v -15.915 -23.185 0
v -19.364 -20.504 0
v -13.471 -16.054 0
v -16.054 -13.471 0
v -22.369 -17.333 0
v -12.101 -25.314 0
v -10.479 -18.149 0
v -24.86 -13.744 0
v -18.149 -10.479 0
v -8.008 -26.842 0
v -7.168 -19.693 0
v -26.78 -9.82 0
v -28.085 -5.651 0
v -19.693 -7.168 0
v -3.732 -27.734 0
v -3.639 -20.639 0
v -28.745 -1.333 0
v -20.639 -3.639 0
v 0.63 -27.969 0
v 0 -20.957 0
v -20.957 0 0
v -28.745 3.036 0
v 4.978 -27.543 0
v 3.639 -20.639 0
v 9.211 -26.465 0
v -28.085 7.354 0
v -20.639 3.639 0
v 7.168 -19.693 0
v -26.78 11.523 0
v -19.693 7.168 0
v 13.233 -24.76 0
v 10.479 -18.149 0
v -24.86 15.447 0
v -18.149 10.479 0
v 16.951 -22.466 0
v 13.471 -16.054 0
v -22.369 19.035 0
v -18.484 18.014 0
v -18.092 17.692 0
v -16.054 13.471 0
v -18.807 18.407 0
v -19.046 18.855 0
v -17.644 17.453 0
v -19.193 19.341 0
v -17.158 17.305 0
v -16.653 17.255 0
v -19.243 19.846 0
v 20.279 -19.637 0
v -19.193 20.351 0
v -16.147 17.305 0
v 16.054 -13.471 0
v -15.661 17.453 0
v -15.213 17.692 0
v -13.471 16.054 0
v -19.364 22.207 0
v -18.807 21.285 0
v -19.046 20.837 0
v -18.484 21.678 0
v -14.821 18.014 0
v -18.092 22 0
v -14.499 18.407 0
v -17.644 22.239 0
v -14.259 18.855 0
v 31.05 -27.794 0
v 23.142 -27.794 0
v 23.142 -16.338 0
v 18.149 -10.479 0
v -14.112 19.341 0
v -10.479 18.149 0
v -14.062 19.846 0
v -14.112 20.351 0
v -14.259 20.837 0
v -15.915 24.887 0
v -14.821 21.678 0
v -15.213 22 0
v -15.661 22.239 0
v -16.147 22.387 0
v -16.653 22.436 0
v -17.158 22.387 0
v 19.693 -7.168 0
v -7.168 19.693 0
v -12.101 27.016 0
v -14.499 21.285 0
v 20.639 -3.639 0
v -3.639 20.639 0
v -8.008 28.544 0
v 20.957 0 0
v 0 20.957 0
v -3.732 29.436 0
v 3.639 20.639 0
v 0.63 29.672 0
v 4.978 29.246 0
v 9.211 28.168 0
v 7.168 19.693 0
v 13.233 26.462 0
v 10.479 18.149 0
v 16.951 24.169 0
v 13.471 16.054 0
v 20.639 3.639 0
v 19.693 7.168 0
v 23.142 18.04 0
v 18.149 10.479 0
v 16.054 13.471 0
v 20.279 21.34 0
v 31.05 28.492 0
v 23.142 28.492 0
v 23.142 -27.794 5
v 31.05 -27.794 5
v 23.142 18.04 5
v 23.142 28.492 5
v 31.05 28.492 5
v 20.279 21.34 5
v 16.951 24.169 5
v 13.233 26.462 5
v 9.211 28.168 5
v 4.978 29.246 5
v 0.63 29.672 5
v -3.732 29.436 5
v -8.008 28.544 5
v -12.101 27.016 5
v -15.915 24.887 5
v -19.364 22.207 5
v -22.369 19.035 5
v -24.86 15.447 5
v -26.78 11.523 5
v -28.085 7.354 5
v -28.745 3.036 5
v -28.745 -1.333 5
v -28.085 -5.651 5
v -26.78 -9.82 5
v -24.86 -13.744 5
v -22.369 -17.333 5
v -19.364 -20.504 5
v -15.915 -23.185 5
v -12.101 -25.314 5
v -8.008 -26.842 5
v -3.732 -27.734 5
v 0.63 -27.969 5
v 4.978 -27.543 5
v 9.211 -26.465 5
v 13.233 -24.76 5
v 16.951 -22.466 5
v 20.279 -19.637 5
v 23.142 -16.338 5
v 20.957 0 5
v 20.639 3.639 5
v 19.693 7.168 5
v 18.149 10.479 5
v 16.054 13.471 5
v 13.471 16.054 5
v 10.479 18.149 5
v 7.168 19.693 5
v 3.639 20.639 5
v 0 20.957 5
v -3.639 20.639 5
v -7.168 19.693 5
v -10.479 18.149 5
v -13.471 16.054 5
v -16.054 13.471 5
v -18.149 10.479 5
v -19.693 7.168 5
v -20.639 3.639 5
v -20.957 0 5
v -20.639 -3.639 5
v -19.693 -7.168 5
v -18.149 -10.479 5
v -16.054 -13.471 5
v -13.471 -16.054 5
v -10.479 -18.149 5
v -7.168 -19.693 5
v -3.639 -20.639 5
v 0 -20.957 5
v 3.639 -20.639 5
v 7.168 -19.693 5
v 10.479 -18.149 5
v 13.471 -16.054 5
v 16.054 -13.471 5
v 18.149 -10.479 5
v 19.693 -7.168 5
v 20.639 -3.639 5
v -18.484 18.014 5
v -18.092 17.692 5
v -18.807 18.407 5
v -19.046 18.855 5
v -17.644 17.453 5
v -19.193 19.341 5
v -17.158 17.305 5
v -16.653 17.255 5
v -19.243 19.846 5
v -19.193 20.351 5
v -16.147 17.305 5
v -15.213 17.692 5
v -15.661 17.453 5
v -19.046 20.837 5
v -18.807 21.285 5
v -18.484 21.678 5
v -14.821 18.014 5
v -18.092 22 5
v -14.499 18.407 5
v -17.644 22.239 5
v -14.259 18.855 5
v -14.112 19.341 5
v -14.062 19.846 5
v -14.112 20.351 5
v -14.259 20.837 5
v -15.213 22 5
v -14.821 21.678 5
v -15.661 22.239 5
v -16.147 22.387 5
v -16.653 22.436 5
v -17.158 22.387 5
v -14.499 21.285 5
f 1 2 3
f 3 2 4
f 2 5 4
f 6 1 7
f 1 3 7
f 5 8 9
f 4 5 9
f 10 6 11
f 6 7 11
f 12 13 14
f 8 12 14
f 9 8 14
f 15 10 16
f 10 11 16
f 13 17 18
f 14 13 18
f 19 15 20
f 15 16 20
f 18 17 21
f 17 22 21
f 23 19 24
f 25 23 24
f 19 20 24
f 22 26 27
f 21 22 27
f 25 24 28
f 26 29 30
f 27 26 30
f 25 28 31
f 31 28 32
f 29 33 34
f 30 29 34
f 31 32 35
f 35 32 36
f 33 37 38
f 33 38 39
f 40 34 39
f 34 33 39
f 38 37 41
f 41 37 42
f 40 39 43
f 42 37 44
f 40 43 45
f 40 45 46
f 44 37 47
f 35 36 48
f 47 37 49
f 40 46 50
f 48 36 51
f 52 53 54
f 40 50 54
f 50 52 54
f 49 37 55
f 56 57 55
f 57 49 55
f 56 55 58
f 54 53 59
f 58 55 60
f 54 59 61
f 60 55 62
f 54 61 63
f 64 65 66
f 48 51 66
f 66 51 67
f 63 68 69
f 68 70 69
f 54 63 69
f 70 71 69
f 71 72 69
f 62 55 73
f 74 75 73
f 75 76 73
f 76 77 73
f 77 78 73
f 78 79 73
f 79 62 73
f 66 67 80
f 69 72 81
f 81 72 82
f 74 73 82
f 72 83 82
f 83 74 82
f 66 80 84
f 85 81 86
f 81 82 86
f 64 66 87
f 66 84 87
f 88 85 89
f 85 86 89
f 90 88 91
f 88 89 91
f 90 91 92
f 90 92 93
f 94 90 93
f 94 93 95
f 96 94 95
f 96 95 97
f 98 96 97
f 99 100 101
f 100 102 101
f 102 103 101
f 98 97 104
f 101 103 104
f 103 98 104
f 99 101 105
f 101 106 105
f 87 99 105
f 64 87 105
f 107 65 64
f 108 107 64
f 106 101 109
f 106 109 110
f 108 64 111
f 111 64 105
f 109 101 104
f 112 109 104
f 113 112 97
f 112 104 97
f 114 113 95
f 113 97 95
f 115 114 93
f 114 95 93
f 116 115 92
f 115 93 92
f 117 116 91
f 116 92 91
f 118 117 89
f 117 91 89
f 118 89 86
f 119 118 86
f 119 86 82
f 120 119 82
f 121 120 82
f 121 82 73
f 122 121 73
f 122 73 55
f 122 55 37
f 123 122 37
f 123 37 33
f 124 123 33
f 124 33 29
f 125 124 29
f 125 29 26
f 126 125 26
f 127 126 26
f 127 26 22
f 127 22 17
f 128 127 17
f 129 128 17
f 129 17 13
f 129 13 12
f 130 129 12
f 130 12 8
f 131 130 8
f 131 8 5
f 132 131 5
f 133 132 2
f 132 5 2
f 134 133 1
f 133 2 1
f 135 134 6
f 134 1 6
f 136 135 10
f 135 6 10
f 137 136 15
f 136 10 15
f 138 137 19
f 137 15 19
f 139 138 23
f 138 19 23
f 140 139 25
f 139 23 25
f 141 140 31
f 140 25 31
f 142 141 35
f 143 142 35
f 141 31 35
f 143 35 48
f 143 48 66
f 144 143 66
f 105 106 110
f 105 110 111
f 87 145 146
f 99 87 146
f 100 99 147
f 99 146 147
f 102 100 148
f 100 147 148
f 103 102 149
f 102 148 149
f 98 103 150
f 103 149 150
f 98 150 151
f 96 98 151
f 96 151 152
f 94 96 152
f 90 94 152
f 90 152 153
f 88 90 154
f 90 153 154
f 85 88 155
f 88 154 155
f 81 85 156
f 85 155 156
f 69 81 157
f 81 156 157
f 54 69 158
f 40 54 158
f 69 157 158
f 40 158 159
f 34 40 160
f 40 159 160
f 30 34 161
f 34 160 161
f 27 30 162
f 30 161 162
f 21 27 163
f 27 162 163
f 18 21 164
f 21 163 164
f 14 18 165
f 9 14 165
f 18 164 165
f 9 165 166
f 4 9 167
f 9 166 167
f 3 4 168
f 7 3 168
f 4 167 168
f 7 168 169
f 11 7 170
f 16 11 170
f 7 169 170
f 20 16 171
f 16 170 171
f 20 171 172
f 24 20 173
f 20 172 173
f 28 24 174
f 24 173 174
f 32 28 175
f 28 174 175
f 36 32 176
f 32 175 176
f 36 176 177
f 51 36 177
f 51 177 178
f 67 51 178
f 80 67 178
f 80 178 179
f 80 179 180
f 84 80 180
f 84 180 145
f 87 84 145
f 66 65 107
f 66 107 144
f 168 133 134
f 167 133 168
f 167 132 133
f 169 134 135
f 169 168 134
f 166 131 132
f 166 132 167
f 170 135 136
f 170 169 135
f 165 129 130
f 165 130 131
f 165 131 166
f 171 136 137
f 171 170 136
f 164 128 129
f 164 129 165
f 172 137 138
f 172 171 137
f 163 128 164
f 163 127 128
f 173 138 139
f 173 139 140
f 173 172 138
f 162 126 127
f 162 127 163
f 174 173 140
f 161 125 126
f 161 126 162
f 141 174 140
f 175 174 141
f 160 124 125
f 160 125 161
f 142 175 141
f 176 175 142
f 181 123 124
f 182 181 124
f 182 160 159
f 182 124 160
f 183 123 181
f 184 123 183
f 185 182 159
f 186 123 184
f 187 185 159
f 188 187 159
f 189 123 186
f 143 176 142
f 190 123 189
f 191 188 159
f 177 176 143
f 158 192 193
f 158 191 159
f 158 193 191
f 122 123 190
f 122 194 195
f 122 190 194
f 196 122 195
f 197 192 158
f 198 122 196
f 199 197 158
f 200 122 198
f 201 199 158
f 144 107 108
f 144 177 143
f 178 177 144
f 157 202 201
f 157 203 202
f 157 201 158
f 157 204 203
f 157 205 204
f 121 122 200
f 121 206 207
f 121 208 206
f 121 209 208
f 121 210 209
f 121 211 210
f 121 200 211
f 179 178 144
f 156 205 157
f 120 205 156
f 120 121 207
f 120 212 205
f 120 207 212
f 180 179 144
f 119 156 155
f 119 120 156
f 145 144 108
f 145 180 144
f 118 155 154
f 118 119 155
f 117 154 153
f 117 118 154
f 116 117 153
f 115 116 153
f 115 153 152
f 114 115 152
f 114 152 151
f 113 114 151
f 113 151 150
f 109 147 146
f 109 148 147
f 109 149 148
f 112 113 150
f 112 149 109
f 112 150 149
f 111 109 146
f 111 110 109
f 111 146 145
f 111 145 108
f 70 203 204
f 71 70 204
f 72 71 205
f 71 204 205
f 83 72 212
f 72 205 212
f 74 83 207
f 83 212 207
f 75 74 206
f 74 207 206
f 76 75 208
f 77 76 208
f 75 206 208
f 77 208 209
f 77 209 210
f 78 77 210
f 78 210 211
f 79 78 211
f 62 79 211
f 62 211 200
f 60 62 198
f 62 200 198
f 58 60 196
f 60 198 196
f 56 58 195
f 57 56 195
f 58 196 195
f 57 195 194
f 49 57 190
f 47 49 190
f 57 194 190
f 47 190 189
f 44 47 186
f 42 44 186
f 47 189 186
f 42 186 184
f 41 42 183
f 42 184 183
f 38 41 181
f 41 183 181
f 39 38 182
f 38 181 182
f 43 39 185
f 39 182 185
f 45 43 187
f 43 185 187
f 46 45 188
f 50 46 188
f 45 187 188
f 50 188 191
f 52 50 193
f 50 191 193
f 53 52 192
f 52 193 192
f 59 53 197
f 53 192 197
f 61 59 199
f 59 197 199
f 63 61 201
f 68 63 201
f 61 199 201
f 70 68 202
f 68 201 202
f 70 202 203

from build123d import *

# Parameters (mm, degrees)
F0_R     = 28.827608
F1_DEPTH = 5
F2_R     = 20.957085
F3_DEPTH = 5
F4_W     = 7.907964
F4_H     = 56.286104
F5_DEPTH = 5
F6_R     = 2.590527
F7_DEPTH = 5


with BuildPart() as f1:
    # F0 (on Top) → F1 (new body)
    with BuildSketch(Plane.XY):
        with Locations((0, 0.851326)):
            Circle(F0_R)
    extrude(amount=F1_DEPTH)

    # F2 (on face) → F3 (cut)
    with BuildSketch(Plane.XY.offset(5)):
        Circle(F2_R)
    extrude(amount=-F3_DEPTH, mode=Mode.SUBTRACT)

    # F4 (on Top) → F5 (join)
    with BuildSketch(Plane.XY):
        with Locations((27.096411, 0.348881)):
            Rectangle(F4_W, F4_H)
    extrude(amount=F5_DEPTH)

    # F6 (on face) → F7 (cut)
    with BuildSketch(Plane.XY.offset(5)):
        with Locations((-16.652713, 19.845931)):
            Circle(F6_R)
    extrude(amount=-F7_DEPTH, mode=Mode.SUBTRACT)


solid = f1.part
